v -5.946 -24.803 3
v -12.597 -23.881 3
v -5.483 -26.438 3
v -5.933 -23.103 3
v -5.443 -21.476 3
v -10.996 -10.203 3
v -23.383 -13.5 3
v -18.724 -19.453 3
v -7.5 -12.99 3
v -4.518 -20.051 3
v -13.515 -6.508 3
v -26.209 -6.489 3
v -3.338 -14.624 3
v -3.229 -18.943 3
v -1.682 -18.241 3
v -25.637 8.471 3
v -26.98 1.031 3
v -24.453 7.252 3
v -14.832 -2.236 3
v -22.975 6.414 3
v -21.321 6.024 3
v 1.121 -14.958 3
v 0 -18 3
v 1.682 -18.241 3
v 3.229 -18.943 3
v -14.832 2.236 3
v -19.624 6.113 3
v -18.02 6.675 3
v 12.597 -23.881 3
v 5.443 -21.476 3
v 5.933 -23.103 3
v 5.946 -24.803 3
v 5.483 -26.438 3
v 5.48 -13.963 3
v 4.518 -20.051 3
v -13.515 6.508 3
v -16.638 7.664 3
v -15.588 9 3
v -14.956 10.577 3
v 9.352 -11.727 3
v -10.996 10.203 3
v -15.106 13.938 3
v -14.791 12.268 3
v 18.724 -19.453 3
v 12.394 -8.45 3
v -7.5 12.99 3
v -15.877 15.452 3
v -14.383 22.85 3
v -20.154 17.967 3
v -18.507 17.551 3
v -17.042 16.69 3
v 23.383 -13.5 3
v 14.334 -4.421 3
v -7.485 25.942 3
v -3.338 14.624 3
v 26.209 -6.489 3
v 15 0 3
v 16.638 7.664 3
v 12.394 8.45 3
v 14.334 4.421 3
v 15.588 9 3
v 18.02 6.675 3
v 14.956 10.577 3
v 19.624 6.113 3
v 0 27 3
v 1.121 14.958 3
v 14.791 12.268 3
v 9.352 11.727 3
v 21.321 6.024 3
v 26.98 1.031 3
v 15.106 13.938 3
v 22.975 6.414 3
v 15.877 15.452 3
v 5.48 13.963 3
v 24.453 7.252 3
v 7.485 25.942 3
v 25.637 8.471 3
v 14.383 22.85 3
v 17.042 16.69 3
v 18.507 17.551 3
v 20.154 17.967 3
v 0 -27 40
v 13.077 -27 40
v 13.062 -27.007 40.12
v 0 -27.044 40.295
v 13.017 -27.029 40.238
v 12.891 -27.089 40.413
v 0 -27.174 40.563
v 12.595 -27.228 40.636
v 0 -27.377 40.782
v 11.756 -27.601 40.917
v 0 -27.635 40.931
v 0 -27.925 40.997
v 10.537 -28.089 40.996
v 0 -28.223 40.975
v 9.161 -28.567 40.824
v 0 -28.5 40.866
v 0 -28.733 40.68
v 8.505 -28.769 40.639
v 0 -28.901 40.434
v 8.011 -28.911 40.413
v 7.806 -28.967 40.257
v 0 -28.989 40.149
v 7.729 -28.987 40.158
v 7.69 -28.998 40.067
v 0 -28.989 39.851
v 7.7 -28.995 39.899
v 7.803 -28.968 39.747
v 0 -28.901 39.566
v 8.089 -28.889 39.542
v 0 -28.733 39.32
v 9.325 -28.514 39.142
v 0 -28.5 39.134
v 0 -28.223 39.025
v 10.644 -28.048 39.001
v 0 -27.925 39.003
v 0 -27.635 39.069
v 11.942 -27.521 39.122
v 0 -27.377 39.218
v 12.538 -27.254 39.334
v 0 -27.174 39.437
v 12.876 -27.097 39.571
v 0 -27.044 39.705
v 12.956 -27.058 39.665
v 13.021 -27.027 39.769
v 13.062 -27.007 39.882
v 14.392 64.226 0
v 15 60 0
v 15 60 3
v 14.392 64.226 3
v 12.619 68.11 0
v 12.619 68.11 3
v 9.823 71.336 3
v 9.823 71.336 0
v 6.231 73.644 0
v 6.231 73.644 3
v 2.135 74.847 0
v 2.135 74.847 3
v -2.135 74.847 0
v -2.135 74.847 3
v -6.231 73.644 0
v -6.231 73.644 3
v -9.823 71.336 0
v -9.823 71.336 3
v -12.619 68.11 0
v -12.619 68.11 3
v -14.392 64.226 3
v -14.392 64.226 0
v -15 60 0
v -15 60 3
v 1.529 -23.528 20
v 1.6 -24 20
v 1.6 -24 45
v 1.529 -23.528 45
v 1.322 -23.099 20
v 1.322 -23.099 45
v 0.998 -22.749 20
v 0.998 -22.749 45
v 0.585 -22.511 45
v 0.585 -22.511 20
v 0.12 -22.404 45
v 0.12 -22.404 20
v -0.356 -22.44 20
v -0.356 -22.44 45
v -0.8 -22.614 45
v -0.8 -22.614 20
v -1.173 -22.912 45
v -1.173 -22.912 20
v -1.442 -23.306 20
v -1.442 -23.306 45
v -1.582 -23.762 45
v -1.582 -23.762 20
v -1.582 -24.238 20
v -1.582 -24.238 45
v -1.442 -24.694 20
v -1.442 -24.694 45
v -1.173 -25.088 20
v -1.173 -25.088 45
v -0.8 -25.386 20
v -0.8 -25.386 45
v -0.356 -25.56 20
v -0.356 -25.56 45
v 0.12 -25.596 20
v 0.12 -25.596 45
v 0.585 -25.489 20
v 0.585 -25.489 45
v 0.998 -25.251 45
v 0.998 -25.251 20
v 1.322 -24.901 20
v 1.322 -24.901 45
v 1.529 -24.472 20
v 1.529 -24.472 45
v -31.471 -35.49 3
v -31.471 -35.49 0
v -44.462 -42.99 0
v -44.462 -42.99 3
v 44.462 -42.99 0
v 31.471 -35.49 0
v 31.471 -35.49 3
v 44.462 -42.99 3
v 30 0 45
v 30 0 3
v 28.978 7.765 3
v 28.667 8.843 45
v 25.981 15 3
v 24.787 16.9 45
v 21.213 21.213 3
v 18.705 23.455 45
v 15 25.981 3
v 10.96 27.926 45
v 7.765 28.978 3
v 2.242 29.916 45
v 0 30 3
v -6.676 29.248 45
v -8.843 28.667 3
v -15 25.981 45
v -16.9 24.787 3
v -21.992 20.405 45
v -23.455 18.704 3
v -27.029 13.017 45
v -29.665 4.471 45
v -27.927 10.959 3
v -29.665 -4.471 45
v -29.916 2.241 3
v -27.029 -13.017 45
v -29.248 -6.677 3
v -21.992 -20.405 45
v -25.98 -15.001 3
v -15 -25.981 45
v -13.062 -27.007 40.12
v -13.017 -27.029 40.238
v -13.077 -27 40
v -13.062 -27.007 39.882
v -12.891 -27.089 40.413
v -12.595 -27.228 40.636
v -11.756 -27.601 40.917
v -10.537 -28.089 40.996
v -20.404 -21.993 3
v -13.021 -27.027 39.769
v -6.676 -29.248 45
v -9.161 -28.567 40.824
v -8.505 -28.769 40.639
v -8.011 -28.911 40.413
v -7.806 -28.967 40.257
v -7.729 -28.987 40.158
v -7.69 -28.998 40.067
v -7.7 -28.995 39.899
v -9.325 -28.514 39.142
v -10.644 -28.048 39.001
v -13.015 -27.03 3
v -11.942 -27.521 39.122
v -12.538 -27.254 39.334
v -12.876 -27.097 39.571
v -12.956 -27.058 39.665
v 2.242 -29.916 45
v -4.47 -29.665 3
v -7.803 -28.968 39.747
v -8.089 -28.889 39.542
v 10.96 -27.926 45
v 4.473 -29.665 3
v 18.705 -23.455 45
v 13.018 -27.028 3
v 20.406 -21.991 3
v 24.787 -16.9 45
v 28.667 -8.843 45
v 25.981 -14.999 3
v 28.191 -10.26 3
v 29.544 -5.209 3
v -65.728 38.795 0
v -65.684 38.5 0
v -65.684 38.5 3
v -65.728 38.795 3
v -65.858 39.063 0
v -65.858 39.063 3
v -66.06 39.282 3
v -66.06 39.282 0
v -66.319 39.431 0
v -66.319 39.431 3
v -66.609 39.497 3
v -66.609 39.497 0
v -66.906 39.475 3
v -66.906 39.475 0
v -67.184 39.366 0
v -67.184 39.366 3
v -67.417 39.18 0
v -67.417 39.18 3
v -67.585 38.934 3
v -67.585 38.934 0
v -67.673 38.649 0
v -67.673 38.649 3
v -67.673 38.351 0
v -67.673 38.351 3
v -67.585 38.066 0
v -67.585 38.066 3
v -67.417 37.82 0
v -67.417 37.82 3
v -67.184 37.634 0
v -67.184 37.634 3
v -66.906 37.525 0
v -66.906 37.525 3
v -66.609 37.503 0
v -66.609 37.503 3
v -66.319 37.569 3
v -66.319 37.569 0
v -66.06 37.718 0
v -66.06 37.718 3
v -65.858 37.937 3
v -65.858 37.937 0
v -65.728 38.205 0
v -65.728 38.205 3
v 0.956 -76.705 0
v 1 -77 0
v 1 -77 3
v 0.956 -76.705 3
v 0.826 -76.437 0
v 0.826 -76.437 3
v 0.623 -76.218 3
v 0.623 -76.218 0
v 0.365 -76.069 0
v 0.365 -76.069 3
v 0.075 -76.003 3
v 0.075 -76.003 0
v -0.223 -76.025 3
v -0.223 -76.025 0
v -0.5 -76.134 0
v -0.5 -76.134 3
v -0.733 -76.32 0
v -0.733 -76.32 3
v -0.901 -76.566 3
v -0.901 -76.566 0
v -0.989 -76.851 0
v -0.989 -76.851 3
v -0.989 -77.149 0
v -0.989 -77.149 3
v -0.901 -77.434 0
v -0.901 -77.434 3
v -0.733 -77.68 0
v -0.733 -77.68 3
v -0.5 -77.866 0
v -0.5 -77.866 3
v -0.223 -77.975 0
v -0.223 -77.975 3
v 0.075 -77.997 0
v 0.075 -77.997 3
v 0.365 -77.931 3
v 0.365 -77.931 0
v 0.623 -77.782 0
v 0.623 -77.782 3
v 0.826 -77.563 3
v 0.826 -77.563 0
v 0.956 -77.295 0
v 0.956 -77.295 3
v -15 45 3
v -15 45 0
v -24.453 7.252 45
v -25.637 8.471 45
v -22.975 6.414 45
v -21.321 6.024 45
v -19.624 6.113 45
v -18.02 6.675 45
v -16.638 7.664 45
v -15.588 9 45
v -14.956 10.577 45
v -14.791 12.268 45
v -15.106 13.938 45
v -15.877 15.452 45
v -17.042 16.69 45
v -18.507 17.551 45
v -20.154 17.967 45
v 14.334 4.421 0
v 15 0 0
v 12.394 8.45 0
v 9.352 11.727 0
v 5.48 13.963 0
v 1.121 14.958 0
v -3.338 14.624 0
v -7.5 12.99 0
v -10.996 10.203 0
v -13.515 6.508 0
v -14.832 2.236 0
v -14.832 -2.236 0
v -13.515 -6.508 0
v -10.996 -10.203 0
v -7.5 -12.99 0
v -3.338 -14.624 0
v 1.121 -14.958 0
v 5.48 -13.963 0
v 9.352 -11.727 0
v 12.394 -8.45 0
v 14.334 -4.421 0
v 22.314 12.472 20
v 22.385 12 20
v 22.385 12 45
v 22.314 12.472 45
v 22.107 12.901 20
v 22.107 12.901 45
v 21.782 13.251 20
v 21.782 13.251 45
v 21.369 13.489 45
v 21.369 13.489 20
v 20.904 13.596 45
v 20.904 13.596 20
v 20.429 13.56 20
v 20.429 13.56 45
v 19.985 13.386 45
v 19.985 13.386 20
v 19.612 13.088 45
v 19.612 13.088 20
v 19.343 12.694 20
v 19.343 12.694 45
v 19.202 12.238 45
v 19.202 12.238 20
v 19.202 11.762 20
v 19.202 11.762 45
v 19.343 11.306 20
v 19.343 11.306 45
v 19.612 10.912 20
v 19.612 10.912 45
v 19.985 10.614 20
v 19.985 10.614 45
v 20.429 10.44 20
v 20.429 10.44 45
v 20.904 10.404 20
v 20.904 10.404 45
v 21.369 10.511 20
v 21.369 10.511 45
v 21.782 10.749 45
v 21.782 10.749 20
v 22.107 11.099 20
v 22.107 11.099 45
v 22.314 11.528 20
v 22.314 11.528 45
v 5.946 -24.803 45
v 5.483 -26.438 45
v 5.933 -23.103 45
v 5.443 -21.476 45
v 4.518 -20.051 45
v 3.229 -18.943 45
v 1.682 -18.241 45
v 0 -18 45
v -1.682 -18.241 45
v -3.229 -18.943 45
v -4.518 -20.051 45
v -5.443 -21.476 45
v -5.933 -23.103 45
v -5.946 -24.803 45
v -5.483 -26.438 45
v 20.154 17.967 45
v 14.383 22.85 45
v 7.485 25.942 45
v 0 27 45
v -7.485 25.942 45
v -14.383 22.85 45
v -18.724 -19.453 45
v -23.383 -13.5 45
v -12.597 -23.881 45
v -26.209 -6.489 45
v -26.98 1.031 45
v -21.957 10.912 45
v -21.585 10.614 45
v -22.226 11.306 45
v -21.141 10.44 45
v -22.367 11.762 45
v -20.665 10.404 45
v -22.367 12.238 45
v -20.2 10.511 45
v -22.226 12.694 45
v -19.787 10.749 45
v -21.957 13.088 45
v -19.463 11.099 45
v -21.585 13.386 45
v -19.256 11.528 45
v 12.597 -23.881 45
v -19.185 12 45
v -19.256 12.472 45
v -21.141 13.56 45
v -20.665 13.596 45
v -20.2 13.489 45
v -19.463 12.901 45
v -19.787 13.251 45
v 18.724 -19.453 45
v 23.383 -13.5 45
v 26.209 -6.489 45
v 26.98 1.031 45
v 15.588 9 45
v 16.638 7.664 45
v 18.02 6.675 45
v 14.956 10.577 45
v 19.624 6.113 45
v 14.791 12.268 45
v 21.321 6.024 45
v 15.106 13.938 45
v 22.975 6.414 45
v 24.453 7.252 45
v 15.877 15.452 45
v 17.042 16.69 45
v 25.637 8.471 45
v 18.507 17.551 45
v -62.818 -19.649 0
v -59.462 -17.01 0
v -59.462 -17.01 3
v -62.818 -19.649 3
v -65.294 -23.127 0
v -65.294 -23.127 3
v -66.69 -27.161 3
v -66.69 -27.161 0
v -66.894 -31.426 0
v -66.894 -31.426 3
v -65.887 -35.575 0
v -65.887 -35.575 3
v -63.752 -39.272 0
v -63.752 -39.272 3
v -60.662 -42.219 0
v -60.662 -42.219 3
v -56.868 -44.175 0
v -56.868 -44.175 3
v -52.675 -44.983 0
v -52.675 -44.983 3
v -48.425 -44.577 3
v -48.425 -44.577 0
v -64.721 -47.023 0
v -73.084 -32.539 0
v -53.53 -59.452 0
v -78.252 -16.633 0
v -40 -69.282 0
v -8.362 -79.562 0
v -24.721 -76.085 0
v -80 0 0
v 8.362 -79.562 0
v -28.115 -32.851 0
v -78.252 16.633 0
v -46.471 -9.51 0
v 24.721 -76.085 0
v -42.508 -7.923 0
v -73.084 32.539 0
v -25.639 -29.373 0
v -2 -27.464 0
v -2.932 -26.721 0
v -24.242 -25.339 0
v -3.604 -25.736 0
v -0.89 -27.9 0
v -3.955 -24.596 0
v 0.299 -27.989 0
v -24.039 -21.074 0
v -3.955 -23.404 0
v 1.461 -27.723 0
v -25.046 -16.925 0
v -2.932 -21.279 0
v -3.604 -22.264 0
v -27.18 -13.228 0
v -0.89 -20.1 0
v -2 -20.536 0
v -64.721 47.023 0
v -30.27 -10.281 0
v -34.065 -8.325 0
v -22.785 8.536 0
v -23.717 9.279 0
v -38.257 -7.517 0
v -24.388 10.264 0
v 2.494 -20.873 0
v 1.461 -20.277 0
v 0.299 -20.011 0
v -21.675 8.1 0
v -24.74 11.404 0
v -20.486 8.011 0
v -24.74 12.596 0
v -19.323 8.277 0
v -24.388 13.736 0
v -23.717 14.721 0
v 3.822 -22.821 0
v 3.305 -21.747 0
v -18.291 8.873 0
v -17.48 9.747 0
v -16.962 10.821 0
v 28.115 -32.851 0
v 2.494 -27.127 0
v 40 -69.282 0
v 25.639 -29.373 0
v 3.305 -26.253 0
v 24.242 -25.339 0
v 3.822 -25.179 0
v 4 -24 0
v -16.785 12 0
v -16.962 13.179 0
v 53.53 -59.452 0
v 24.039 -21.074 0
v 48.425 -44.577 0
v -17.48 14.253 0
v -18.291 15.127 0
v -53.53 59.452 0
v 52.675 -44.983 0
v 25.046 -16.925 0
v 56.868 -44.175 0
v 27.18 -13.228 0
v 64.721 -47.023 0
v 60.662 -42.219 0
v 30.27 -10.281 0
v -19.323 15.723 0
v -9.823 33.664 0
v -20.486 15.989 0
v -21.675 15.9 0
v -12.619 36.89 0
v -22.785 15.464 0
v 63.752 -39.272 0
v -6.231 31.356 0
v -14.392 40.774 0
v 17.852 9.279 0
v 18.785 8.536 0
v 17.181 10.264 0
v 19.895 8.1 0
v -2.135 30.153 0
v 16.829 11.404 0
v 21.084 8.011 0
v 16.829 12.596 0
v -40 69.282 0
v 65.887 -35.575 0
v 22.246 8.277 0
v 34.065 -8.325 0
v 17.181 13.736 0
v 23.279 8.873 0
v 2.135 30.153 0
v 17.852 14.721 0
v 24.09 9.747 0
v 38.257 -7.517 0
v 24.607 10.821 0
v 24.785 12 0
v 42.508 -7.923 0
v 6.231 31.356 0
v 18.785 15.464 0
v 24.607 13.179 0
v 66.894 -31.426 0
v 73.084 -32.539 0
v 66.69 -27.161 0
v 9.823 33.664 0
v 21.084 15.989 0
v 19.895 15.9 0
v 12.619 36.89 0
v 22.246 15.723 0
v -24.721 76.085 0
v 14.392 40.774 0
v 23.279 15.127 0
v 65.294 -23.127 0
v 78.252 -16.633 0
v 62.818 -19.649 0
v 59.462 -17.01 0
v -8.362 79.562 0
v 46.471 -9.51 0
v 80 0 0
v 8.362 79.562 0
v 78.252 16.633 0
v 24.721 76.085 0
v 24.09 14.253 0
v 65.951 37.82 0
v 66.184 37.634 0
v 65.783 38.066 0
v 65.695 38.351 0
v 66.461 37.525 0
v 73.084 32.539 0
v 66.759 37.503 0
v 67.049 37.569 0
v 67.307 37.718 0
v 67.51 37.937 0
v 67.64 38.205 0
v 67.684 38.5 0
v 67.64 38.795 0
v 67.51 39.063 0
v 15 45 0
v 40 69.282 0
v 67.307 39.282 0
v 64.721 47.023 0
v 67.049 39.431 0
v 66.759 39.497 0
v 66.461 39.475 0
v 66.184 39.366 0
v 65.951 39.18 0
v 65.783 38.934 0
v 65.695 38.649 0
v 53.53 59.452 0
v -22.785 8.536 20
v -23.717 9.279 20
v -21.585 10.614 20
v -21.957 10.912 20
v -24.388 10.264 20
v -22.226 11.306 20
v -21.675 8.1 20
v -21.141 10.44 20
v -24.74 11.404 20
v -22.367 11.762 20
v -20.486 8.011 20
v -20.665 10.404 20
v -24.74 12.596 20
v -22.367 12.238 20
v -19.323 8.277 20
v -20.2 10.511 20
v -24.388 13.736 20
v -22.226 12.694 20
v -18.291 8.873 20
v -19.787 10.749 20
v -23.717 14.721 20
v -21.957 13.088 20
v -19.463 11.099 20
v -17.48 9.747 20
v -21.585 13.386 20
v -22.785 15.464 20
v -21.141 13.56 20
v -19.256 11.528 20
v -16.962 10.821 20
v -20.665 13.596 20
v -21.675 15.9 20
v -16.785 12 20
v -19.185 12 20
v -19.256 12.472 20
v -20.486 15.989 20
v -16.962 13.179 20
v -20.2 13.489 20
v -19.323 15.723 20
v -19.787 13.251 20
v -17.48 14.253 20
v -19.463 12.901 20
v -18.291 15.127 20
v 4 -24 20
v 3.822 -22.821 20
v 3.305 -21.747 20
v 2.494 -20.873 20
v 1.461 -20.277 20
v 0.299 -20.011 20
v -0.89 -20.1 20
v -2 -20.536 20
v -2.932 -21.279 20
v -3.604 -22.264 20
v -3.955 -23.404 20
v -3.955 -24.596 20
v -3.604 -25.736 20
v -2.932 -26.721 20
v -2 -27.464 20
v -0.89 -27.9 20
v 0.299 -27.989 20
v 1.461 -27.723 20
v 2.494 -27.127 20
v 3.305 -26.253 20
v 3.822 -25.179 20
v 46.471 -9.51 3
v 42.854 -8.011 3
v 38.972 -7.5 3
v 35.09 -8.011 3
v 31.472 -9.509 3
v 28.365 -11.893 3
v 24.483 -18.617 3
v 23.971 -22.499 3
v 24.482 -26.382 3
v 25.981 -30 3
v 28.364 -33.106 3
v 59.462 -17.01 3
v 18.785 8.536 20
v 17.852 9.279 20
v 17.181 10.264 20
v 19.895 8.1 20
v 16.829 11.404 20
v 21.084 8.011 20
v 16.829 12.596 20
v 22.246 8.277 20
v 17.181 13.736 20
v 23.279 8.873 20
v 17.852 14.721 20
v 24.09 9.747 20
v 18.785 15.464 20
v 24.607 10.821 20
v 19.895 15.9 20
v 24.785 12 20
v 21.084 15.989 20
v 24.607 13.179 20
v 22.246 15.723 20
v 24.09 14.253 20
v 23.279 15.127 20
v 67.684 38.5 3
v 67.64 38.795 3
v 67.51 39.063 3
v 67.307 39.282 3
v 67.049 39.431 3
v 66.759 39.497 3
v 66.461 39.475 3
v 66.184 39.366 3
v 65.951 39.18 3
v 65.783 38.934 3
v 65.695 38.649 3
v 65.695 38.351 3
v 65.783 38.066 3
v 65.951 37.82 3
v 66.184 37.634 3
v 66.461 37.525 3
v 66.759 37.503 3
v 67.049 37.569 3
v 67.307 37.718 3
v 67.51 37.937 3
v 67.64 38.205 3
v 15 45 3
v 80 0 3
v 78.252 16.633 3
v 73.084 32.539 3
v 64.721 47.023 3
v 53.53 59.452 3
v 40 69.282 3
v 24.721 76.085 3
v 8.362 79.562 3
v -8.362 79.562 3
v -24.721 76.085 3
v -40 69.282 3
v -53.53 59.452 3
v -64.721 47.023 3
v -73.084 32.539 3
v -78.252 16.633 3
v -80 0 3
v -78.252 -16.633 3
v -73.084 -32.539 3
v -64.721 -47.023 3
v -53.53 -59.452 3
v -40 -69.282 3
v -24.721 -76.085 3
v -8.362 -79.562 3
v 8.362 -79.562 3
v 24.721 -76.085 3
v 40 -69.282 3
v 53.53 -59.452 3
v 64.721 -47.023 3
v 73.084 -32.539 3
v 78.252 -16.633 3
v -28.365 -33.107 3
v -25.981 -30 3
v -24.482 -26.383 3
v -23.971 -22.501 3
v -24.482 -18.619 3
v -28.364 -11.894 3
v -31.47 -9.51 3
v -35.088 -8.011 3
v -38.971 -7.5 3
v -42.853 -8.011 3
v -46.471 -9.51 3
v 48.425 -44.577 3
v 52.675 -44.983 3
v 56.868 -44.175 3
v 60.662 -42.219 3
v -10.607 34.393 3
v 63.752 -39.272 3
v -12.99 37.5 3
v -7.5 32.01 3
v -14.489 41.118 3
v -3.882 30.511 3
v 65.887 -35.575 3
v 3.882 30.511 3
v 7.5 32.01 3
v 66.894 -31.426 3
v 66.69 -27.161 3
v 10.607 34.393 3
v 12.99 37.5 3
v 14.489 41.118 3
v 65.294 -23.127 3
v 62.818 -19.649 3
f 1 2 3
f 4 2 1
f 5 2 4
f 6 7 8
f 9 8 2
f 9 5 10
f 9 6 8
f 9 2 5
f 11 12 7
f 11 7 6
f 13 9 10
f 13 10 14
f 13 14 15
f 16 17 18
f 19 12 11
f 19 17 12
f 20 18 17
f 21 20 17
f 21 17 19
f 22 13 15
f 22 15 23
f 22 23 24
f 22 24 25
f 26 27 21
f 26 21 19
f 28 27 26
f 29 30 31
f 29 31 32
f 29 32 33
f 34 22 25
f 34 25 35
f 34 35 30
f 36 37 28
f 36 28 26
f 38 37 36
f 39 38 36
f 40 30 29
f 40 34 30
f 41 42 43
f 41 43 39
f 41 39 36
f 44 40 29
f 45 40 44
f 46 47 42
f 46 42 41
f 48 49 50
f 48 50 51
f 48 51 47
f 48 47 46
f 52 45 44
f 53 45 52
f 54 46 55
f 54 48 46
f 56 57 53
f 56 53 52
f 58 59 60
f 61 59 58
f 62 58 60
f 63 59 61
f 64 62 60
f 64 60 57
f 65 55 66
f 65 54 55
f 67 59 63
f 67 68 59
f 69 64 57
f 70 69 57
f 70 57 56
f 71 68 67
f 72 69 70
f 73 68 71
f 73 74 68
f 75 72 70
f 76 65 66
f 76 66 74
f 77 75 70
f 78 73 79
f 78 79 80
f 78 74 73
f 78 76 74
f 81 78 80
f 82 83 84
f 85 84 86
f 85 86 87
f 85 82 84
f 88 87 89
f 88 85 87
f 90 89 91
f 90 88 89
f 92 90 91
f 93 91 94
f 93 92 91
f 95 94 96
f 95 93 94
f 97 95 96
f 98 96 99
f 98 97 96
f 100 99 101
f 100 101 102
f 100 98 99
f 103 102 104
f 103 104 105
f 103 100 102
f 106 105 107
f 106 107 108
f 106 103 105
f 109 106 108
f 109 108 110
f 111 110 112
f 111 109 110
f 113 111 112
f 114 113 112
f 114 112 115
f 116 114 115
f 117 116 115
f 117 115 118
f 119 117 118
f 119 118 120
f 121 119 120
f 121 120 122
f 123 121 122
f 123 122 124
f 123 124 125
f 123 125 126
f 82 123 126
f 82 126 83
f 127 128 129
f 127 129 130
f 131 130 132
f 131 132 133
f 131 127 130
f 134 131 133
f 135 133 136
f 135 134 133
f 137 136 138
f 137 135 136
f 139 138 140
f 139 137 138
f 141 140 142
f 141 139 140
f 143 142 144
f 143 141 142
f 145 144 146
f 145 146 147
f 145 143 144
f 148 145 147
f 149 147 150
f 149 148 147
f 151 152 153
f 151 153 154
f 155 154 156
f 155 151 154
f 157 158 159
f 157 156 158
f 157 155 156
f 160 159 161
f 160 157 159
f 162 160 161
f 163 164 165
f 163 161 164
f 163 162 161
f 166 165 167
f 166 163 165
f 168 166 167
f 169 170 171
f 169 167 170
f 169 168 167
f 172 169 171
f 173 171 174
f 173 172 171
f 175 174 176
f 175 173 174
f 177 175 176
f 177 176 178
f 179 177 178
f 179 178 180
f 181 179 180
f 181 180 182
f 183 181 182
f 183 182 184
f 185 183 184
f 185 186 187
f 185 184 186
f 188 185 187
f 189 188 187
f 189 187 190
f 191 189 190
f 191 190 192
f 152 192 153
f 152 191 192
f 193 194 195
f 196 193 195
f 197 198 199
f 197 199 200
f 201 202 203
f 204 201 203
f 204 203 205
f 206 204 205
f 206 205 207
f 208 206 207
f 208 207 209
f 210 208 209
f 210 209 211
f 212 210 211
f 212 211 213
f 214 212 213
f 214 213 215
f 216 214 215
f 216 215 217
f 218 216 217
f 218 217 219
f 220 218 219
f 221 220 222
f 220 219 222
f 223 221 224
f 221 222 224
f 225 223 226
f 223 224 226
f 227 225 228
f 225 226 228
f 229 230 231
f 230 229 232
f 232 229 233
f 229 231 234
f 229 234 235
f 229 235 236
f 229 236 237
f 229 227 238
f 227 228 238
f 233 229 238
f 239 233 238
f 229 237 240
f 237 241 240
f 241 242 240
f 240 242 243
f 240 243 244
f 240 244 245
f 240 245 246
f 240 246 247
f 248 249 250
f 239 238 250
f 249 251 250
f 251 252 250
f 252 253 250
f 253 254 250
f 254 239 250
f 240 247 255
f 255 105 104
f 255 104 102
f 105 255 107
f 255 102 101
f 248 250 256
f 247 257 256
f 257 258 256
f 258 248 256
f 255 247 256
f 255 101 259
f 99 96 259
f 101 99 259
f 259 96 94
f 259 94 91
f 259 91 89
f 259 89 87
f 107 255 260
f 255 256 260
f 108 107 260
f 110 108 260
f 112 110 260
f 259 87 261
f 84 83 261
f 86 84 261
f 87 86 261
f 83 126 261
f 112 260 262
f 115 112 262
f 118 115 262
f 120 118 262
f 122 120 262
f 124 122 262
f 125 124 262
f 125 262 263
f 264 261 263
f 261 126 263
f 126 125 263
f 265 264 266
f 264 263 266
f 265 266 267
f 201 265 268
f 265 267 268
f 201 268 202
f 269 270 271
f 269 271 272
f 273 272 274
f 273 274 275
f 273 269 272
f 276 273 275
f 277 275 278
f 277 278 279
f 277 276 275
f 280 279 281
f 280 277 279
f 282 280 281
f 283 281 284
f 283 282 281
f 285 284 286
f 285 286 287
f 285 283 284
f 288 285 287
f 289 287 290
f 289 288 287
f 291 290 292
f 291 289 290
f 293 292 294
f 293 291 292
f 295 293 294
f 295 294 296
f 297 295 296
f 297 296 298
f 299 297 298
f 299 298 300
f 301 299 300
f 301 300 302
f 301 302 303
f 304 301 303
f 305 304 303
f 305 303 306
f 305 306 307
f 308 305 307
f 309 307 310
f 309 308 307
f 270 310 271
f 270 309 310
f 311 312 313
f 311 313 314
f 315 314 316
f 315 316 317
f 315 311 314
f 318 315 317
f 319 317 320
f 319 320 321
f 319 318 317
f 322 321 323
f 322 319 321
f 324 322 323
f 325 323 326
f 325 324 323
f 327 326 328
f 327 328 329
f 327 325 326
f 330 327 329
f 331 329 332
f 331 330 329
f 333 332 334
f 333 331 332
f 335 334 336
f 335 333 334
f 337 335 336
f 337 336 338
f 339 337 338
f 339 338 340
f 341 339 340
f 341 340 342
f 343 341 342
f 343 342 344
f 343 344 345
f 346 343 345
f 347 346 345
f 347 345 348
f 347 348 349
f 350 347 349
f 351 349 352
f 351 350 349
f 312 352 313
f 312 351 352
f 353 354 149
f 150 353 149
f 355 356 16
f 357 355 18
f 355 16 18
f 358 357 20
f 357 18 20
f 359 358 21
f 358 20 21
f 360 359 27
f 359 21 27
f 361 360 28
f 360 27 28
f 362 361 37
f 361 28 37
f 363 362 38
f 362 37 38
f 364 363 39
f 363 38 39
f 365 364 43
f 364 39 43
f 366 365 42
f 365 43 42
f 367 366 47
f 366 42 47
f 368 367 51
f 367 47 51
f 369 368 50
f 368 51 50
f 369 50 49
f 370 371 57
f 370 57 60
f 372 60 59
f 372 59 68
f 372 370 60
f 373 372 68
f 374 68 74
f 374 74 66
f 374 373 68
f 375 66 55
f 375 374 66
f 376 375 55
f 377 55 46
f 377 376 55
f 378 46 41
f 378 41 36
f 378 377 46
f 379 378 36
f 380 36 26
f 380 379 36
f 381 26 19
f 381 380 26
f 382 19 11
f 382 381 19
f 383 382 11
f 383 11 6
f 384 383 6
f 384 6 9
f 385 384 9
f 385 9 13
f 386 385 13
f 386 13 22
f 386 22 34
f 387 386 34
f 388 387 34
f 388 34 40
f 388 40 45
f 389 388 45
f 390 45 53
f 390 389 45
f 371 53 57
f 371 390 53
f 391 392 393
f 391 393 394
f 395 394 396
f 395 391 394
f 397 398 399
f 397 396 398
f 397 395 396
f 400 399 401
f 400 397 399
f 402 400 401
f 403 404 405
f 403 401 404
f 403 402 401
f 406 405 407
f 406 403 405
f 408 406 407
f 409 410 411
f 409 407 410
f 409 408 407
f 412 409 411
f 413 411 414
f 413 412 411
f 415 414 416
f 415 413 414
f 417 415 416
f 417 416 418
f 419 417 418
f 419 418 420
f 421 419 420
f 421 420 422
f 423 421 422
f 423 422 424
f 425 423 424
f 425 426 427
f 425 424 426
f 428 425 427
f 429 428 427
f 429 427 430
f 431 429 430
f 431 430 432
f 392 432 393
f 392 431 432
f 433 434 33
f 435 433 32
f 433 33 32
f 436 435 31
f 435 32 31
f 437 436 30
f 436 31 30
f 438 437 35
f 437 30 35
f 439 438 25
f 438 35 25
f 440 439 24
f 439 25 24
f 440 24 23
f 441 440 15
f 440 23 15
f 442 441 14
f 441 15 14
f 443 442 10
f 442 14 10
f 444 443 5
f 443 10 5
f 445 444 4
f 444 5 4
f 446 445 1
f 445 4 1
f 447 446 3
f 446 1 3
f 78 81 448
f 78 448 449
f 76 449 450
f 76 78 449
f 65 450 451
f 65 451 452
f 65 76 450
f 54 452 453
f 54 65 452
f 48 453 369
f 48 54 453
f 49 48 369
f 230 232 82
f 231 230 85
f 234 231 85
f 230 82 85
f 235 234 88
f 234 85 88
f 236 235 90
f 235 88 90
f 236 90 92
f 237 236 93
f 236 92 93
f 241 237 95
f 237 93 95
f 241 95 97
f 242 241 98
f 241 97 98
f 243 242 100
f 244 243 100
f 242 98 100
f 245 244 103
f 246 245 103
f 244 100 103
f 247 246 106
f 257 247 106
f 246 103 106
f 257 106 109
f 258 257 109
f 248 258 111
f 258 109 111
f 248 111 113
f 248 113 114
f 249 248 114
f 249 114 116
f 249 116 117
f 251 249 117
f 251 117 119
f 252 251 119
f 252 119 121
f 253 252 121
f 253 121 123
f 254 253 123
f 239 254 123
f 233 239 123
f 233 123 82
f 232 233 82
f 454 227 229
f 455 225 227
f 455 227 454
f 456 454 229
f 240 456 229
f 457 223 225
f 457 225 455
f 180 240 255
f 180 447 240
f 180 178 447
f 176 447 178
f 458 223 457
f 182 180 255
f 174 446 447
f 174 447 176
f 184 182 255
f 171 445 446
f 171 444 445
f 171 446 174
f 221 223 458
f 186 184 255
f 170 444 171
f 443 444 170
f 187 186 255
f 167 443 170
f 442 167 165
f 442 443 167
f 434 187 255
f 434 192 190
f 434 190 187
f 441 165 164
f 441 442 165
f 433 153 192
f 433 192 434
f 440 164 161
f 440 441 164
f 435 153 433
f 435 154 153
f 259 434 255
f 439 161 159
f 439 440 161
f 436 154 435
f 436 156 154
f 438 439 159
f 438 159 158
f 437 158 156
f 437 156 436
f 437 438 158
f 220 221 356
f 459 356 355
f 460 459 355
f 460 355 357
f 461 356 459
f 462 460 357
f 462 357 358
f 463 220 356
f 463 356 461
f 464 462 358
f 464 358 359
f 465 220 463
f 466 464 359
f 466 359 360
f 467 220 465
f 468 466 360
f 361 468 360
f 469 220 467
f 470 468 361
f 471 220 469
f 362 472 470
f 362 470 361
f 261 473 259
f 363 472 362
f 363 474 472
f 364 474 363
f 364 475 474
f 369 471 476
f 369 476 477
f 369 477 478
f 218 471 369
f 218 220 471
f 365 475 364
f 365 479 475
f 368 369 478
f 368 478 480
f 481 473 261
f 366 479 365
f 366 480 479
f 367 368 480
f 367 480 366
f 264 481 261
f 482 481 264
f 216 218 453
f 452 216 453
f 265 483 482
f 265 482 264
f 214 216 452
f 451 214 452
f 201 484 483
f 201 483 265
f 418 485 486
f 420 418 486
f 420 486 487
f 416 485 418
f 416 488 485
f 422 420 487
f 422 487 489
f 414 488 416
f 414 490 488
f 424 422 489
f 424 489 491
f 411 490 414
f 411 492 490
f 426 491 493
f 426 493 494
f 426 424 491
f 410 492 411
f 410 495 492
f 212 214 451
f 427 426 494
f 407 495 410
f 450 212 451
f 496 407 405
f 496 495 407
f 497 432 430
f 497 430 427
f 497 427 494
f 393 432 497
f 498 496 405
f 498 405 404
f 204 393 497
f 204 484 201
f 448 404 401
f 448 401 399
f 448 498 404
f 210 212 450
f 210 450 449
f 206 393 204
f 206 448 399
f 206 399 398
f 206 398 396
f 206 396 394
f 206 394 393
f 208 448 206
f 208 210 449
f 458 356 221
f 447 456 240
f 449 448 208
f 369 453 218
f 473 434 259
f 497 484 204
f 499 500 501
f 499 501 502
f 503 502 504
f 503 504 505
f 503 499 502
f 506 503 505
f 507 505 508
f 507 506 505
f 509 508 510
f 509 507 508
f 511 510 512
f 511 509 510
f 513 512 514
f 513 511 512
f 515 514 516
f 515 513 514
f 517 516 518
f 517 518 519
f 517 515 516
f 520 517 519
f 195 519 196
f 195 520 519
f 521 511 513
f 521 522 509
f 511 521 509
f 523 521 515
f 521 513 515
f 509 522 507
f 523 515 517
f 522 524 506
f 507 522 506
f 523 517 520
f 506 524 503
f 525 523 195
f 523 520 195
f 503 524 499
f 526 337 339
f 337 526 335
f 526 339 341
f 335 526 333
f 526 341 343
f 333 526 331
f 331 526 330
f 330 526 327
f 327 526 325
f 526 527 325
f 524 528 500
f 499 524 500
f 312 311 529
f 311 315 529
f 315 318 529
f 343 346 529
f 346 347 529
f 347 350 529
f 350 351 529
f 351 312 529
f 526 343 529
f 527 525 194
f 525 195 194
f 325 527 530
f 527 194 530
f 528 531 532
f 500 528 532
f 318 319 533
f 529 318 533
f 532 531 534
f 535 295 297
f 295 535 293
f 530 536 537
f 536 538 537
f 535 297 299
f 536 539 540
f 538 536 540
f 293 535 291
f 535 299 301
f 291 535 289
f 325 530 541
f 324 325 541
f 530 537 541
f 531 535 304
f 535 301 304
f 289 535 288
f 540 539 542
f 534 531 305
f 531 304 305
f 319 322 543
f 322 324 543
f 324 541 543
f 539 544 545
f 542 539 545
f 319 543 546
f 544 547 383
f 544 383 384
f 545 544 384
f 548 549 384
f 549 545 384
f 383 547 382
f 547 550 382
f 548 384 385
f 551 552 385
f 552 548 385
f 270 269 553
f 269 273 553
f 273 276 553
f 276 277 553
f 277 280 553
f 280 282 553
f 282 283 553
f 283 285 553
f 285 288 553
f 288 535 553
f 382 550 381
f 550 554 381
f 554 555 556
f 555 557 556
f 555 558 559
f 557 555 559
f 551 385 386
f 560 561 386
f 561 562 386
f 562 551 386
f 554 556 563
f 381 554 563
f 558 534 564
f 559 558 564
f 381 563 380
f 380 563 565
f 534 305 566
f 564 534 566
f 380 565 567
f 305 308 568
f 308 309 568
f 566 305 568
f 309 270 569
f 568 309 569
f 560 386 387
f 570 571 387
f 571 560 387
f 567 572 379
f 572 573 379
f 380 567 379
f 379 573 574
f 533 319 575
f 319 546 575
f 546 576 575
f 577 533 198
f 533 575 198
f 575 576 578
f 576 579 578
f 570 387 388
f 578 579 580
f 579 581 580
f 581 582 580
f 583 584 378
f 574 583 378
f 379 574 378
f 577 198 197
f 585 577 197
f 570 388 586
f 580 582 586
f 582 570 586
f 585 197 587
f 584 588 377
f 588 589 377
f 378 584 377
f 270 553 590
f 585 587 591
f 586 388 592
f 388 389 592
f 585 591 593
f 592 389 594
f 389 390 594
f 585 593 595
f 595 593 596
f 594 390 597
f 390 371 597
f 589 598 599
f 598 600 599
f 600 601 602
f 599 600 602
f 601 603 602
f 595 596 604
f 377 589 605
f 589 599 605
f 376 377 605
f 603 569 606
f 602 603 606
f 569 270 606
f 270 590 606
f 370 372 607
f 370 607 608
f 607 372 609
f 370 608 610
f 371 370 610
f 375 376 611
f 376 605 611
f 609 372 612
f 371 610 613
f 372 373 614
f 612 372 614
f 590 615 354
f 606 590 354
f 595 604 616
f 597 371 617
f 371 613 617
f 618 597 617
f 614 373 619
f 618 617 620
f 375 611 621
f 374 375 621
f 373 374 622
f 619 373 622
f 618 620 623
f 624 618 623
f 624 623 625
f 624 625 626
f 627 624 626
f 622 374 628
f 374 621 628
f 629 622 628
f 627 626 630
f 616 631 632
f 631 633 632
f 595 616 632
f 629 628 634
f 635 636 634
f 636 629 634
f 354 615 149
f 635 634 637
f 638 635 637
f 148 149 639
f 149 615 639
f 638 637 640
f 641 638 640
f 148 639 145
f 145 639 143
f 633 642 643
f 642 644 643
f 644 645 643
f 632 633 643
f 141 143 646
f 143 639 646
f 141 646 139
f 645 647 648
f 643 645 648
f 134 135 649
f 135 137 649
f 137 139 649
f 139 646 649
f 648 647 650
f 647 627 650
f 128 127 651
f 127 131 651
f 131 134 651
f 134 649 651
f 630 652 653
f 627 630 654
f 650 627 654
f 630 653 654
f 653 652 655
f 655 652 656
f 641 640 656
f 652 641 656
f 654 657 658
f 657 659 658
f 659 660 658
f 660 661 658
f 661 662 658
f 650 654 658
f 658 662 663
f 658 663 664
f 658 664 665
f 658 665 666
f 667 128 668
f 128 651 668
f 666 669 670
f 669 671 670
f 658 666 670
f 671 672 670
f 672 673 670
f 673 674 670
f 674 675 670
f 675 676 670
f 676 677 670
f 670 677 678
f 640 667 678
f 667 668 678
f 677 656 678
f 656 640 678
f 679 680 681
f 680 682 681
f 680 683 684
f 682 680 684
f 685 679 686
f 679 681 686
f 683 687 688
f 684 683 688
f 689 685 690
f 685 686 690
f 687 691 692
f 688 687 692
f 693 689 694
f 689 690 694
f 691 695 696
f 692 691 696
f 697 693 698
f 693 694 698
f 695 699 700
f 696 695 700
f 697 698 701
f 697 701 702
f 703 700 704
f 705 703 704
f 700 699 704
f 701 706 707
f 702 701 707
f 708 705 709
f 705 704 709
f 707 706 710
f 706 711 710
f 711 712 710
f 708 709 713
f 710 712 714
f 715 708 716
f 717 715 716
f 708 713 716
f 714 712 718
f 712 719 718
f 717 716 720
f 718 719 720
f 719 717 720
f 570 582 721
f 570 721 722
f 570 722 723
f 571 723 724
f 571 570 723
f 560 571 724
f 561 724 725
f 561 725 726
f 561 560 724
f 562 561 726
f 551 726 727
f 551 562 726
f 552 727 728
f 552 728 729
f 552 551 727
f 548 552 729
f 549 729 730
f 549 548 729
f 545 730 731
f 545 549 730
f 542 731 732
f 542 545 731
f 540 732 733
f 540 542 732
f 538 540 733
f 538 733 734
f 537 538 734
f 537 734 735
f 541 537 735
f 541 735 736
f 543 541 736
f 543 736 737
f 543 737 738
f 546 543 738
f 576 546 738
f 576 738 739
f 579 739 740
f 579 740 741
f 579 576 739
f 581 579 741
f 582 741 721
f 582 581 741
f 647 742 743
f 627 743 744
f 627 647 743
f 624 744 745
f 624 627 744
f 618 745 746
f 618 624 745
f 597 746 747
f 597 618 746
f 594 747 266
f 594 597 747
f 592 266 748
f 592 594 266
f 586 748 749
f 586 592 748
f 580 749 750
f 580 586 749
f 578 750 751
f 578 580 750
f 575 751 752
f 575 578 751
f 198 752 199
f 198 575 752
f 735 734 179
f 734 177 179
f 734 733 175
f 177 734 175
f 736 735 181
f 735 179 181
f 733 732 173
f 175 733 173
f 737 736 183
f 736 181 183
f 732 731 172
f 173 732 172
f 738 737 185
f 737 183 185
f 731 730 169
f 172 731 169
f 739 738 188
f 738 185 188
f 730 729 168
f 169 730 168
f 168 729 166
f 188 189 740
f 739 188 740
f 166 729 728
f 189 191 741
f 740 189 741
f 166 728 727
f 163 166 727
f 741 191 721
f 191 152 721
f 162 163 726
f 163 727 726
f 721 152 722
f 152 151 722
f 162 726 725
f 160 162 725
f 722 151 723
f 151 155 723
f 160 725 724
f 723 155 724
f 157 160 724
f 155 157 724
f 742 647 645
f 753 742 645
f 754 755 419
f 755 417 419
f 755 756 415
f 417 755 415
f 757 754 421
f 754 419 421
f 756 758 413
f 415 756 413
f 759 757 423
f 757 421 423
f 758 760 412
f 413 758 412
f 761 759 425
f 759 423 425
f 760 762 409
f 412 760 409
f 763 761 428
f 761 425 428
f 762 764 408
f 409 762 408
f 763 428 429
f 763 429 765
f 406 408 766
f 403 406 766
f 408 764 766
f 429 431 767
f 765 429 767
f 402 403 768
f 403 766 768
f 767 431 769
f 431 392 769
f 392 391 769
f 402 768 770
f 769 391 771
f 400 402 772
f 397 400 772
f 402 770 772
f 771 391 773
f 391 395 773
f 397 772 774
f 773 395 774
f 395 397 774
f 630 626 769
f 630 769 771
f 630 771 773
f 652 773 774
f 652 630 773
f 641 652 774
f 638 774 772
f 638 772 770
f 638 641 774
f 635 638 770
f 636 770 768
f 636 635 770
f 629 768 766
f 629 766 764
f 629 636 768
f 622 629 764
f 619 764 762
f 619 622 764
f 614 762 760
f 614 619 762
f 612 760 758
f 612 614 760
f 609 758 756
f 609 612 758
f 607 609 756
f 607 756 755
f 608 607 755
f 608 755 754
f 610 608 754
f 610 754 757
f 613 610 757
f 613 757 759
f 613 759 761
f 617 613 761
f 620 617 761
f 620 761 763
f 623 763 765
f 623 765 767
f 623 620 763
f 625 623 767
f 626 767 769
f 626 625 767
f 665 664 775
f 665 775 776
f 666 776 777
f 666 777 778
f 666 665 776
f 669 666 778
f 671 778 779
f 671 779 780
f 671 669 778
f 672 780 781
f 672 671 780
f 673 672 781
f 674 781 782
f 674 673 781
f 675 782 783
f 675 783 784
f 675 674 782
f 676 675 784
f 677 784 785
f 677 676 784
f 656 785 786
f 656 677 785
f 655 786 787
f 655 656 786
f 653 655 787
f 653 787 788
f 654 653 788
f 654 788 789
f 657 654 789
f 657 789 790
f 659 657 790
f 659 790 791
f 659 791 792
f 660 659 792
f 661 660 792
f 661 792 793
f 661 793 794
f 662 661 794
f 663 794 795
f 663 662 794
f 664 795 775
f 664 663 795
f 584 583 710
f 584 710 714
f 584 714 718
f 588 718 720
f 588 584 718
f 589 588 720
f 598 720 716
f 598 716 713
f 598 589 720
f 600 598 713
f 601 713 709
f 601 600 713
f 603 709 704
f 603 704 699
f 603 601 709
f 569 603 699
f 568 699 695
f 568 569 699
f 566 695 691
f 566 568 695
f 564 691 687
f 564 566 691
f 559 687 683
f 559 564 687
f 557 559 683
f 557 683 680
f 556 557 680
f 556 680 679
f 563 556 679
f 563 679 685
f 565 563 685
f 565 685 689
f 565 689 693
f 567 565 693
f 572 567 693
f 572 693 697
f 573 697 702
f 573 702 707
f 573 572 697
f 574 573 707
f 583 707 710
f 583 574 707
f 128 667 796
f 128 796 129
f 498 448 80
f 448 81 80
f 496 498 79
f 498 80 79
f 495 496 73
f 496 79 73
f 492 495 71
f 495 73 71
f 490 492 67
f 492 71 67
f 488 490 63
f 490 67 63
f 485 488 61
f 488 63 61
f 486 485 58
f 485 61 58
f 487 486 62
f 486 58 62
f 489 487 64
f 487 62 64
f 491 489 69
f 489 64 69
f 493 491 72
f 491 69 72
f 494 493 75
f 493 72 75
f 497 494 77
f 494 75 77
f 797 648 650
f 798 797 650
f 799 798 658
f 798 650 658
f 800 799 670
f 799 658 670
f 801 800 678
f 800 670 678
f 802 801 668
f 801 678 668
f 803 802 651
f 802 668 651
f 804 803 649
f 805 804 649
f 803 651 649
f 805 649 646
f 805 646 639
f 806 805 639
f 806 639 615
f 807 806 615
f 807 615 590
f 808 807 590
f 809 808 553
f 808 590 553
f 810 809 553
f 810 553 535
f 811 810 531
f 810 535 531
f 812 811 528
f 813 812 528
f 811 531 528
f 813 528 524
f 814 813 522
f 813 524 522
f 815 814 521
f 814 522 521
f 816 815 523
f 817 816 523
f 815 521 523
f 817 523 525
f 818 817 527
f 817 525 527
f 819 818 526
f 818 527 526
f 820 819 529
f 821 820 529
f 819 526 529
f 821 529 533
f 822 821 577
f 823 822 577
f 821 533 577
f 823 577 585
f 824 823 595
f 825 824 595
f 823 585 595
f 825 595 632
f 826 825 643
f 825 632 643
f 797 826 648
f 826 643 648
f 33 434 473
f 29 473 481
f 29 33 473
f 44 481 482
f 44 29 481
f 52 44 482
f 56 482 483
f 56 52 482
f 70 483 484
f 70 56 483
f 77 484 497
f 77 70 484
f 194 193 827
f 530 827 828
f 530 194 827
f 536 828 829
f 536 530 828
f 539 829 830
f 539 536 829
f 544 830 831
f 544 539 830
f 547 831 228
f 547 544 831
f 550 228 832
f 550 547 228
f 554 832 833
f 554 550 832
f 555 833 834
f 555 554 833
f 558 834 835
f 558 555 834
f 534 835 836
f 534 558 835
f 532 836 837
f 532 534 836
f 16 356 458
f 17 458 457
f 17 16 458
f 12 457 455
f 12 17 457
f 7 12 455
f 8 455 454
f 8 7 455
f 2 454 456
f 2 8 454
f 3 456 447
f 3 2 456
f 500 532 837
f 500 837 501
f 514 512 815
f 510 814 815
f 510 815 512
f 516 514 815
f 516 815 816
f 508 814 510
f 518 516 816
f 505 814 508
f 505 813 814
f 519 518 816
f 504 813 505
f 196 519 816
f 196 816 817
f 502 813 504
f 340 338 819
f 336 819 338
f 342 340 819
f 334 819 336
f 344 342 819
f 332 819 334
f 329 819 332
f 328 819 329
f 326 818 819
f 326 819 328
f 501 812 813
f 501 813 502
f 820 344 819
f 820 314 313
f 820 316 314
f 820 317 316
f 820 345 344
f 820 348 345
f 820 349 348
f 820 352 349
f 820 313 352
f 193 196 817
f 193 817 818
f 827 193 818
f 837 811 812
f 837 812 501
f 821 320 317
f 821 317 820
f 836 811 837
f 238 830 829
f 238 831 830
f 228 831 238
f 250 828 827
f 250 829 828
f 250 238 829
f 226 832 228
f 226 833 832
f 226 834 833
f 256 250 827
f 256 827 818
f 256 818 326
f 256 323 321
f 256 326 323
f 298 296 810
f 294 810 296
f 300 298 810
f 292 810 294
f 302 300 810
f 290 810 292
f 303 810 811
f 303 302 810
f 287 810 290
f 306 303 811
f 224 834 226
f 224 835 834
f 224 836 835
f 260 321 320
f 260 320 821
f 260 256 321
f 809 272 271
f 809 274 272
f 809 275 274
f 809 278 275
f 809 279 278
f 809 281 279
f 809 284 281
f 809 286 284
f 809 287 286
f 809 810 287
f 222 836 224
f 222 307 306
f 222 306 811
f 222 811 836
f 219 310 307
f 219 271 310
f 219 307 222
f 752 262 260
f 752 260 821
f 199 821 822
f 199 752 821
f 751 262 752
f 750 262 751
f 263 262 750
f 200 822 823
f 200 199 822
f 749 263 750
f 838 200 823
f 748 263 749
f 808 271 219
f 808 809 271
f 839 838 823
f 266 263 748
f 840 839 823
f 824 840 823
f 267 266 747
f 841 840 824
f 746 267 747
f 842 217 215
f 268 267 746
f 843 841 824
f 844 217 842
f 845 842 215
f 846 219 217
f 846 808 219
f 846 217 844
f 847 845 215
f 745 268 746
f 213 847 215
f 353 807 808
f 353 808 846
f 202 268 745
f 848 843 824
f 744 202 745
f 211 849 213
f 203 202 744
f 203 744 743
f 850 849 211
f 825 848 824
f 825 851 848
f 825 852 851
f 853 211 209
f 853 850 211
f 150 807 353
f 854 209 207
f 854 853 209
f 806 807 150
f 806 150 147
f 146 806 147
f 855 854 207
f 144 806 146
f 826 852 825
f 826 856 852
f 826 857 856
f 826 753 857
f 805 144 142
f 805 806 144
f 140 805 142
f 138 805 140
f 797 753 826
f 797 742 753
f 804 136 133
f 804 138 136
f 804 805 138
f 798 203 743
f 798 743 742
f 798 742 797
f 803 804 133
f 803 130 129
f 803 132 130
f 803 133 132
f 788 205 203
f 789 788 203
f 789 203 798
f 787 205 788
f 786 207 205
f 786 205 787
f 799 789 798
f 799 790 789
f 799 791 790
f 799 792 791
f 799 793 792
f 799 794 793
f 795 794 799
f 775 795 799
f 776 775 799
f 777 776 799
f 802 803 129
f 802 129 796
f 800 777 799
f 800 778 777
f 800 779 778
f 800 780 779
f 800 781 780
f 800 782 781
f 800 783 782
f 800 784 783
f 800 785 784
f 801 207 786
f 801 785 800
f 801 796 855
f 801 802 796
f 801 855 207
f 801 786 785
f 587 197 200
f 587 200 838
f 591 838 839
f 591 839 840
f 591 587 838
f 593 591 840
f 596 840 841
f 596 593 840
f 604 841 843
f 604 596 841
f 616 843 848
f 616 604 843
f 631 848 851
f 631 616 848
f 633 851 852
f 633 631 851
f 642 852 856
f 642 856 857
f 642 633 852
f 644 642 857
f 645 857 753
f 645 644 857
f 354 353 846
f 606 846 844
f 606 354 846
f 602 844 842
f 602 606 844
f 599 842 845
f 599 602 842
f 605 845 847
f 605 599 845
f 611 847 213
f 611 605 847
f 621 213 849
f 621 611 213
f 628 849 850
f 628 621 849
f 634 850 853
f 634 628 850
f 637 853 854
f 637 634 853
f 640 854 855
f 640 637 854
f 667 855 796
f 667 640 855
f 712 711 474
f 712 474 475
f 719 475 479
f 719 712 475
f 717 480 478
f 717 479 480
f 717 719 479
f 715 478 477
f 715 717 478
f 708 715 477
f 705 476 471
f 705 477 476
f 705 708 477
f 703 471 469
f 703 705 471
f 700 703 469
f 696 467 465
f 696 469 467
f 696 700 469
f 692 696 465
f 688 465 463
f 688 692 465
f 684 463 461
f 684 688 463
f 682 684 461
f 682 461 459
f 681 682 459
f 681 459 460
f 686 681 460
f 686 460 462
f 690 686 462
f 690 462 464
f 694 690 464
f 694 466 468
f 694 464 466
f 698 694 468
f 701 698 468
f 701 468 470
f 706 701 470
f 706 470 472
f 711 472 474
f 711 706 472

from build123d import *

# Parameters (mm, degrees)
SKETCH_R             = 80
SKETCH_R_2           = 15
SKETCH_R_3           = 1
PAD_DEPTH            = 3
SKETCH001_R          = 30
SKETCH001_R_2        = 27
PAD001_DEPTH         = 45
SKETCH002_R          = 6
PAD002_DEPTH         = 45
SKETCH004_R          = 1.6
POCKET_DEPTH         = 45.001
SKETCH003_R          = 4
POCKET001_DEPTH      = 20
SKETCH005_R          = 1
POCKET002_DEPTH      = 80.001
POCKET002_DEPTH_BACK = -80.001


with BuildPart() as part:
    # Sketch → Pad (new body)
    with BuildSketch(Plane.XY):
        Circle(SKETCH_R)
        Circle(SKETCH_R_2, mode=Mode.SUBTRACT)
        with Locations((-66.683956, 38.5)):
            Circle(SKETCH_R_3, mode=Mode.SUBTRACT)
        with Locations((66.683956, 38.5)):
            Circle(SKETCH_R_3, mode=Mode.SUBTRACT)
        with Locations((0, -77)):
            Circle(SKETCH_R_3, mode=Mode.SUBTRACT)
        with BuildLine():
            ThreePointArc((-15, 45), (0, 30), (15, 45))
            Line((15, 45), (15, 60))
            ThreePointArc((15, 60), (0, 75), (-15, 60))
            Line((-15, 45), (-15, 60))
        make_face(mode=Mode.SUBTRACT)
        with BuildLine():
            ThreePointArc((-31.471143, -35.490381), (-25.980762, -15), (-46.471143, -9.509619))
            Line((-46.471143, -9.509619), (-59.461524, -17.009619))
            ThreePointArc((-59.461524, -17.009619), (-64.951905, -37.5), (-44.461524, -42.990381))
            Line((-31.471143, -35.490381), (-44.461524, -42.990381))
        make_face(mode=Mode.SUBTRACT)
        with BuildLine():
            ThreePointArc((46.471143, -9.509619), (25.980762, -15), (31.471143, -35.490381))
            Line((31.471143, -35.490381), (44.461524, -42.990381))
            ThreePointArc((44.461524, -42.990381), (64.951905, -37.5), (59.461524, -17.009619))
            Line((46.471143, -9.509619), (59.461524, -17.009619))
        make_face(mode=Mode.SUBTRACT)
    extrude(amount=PAD_DEPTH)

    # Sketch001 → Pad001 (join)
    with BuildSketch(Plane.XY):
        Circle(SKETCH001_R)
        Circle(SKETCH001_R_2, mode=Mode.SUBTRACT)
    extrude(amount=PAD001_DEPTH)

    # Sketch002 → Pad002 (join)
    with BuildSketch(Plane.XY):
        with Locations((-20.78461, 12)):
            Circle(SKETCH002_R)
        with Locations((0, -24)):
            Circle(SKETCH002_R)
        with Locations((20.78461, 12)):
            Circle(SKETCH002_R)
    extrude(amount=PAD002_DEPTH)

    # Sketch004 → Pocket (cut, through all)
    with BuildSketch(Plane.XY):
        with Locations((-20.78461, 12)):
            Circle(SKETCH004_R)
        with Locations((20.78461, 12)):
            Circle(SKETCH004_R)
        with Locations((0, -24)):
            Circle(SKETCH004_R)
    extrude(amount=POCKET_DEPTH, mode=Mode.SUBTRACT)

    # Sketch003 → Pocket001 (cut)
    with BuildSketch(Plane.XY):
        with Locations((-20.78461, 12)):
            Circle(SKETCH003_R)
        with Locations((20.78461, 12)):
            Circle(SKETCH003_R)
        with Locations((0, -24)):
            Circle(SKETCH003_R)
    extrude(amount=POCKET001_DEPTH, mode=Mode.SUBTRACT)

    # Sketch005 → Pocket002 (cut, two sides)
    with BuildSketch(Plane.YZ) as pocket002_sk:
        with Locations((-28, 40)):
            Circle(SKETCH005_R)
    extrude(amount=-POCKET002_DEPTH, mode=Mode.SUBTRACT)
    extrude(pocket002_sk.sketch, amount=-POCKET002_DEPTH_BACK, mode=Mode.SUBTRACT)


solid = part.part
